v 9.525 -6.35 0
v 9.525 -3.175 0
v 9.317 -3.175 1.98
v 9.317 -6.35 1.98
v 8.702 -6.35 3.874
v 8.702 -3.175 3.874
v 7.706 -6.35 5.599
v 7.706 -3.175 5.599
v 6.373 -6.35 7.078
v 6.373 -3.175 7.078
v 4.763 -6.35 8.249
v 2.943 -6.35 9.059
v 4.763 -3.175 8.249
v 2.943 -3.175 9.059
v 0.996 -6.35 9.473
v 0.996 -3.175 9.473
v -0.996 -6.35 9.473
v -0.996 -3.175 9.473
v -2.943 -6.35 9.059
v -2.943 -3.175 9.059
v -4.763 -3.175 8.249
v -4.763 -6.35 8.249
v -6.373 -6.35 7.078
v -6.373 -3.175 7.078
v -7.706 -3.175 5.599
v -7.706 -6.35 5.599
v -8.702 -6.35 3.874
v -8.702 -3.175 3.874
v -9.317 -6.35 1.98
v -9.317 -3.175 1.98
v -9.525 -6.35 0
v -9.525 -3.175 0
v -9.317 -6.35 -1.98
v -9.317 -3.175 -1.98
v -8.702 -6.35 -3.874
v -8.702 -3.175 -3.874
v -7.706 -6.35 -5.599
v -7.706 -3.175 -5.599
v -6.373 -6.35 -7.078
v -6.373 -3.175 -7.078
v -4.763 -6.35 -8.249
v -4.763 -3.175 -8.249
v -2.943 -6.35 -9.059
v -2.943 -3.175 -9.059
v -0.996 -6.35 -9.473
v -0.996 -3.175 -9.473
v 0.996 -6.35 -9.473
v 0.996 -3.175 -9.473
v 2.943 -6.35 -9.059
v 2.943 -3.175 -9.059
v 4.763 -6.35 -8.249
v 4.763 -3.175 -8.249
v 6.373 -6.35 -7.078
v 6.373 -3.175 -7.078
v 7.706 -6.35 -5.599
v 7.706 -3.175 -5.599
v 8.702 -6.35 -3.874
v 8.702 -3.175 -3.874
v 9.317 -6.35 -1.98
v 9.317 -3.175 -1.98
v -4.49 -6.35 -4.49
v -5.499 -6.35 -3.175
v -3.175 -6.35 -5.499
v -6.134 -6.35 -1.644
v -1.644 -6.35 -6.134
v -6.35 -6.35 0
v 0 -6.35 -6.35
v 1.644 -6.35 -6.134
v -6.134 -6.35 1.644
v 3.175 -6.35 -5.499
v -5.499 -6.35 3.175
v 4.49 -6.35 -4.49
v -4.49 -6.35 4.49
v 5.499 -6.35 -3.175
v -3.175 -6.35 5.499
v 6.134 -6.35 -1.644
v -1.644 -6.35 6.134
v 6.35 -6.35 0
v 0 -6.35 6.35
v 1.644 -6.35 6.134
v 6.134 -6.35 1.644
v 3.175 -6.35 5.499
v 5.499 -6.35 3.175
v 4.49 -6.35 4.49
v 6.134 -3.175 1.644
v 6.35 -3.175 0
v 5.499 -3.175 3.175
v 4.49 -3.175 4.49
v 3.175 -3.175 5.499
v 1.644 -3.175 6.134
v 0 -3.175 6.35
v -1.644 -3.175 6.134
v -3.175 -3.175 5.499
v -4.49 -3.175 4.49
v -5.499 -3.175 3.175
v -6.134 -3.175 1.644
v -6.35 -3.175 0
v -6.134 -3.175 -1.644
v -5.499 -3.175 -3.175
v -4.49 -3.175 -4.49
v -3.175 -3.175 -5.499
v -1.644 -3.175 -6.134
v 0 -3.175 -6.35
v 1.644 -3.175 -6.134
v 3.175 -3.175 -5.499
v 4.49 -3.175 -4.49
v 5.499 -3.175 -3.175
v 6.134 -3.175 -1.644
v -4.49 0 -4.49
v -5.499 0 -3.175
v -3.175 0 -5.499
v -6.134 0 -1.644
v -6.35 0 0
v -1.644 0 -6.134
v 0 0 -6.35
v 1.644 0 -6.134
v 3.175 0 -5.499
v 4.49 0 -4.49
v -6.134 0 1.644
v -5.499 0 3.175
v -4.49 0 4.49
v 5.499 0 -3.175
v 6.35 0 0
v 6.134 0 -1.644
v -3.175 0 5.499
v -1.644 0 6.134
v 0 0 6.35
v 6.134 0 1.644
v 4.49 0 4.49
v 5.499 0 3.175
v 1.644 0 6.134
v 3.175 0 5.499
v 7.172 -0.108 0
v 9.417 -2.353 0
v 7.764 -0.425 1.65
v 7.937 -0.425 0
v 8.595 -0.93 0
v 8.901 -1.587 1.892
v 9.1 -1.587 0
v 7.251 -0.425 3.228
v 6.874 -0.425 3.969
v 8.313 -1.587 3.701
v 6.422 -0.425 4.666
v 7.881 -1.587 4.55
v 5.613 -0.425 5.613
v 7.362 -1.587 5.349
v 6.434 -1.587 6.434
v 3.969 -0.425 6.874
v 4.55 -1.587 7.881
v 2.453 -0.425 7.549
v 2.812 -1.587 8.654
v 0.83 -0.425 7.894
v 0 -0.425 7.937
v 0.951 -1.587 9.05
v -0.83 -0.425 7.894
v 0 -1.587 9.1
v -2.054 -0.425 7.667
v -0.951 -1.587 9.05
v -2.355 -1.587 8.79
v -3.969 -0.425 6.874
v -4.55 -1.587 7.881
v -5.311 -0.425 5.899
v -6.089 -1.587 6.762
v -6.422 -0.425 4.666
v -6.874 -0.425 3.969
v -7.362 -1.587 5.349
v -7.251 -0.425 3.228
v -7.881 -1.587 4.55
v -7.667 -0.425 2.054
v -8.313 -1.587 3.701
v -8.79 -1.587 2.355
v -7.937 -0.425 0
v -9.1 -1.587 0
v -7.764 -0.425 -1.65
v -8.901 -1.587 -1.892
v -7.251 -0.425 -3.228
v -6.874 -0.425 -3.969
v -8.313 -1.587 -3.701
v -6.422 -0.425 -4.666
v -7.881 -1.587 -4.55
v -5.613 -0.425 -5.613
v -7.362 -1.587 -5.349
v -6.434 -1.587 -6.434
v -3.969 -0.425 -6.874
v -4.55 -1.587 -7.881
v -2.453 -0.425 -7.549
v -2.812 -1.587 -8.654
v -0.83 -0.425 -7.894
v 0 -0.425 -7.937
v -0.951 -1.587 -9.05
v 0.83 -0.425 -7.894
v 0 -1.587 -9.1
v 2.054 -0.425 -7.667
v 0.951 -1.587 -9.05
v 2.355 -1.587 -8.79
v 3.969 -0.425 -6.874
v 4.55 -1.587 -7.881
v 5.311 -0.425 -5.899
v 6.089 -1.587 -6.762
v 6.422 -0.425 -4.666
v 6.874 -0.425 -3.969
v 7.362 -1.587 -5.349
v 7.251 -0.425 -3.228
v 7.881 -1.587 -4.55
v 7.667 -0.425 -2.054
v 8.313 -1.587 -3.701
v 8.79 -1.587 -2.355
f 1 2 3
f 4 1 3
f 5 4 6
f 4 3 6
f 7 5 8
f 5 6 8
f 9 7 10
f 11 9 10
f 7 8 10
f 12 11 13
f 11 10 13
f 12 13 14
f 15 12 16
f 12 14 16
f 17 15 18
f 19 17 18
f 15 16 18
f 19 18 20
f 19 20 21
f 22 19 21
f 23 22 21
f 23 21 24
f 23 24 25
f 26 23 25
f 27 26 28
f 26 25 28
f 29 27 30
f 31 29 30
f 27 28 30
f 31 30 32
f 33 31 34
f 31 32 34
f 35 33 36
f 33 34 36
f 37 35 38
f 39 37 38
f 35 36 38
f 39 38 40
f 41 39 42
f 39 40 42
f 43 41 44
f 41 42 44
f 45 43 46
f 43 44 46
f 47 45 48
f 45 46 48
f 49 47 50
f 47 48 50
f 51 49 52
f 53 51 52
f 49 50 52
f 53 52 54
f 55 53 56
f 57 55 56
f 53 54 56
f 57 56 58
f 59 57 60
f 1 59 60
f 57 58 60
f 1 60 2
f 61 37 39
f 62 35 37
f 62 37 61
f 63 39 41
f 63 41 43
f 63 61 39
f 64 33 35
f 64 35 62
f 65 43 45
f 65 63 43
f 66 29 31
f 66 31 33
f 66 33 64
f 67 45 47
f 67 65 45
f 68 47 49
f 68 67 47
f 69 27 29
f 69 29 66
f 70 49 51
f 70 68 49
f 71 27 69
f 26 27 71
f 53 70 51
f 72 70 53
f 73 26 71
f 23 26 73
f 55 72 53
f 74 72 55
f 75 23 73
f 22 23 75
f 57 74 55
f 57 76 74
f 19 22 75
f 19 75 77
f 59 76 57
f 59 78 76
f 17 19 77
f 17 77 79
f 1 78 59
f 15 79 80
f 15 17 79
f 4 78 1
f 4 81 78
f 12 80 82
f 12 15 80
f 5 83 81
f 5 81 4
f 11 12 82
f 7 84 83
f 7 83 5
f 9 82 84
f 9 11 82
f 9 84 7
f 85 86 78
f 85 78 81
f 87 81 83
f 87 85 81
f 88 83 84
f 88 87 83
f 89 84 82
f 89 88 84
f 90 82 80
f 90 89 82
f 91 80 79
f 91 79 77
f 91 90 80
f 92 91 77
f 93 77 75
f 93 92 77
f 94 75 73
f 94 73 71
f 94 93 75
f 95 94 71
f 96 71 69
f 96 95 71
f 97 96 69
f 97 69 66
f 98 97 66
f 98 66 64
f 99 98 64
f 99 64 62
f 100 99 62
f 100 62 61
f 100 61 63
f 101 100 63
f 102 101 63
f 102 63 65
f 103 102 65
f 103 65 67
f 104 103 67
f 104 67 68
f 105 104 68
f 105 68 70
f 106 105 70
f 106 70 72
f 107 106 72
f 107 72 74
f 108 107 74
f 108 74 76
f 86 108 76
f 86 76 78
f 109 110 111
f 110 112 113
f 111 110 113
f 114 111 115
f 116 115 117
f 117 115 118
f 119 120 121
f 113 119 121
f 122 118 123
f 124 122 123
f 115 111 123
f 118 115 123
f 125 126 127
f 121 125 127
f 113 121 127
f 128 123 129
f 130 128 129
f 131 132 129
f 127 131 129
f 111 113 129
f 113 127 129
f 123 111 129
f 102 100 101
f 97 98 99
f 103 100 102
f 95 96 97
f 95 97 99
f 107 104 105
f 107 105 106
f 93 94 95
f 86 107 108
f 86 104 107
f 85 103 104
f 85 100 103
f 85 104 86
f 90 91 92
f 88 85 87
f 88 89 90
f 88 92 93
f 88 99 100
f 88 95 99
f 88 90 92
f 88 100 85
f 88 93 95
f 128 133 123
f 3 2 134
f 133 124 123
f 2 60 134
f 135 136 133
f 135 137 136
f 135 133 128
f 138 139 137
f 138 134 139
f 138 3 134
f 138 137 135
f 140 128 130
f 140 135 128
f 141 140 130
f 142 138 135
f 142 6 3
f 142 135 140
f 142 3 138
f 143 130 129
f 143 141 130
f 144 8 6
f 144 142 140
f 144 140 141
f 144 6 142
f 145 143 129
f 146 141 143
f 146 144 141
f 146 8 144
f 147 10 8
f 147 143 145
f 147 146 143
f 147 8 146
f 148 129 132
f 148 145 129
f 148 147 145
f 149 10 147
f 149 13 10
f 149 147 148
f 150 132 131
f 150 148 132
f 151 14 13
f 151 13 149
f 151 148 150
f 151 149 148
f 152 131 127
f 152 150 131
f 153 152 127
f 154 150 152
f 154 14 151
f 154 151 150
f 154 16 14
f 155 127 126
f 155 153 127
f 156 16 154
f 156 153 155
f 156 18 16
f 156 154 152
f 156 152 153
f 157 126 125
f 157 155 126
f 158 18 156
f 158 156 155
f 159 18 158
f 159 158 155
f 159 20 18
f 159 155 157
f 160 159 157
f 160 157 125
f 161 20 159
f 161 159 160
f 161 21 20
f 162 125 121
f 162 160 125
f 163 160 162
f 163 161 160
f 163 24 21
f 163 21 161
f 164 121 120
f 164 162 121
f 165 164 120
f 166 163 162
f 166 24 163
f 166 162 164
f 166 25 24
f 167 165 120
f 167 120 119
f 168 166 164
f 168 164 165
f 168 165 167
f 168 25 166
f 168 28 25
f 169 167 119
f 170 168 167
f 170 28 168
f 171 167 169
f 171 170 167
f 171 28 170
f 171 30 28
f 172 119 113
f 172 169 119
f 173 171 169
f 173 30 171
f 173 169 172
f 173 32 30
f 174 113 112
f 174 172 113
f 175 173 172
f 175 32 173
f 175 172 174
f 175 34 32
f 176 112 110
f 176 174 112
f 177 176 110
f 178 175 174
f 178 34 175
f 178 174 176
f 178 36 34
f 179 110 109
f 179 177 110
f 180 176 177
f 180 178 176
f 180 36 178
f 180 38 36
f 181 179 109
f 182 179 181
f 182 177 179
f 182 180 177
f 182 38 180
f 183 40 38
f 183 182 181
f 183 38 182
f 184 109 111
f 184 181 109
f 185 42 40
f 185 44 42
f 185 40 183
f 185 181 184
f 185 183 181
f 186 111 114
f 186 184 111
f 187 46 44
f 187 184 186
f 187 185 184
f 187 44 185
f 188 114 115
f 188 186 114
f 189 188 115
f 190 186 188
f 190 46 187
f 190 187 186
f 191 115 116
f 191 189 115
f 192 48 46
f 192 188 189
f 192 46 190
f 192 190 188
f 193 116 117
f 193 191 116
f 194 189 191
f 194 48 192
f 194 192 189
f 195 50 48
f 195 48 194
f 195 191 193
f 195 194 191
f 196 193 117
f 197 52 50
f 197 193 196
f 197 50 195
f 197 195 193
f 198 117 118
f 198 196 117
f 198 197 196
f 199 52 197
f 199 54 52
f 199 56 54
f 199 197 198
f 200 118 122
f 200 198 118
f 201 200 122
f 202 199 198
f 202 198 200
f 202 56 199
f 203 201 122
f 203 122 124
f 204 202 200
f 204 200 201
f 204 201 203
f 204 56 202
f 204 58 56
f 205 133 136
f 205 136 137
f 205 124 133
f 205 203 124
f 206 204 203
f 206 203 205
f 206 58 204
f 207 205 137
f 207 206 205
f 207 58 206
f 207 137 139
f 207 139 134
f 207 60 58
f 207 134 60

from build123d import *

# Parameters (mm, degrees)
F0_R     = 9.525
F0_R_2   = 6.35
F1_DEPTH = 6.35
F2_DEPTH = 3.175
F3_R     = 3.175


with BuildPart() as f1:
    # F0 (on Front) → F1 (new body)
    with BuildSketch(Plane.XZ):
        Circle(F0_R)
        Circle(F0_R_2, mode=Mode.SUBTRACT)
    extrude(amount=F1_DEPTH)

    # F0 (on Front) → F2 (join)
    with BuildSketch(Plane.XZ):
        Circle(F0_R_2)
    extrude(amount=F2_DEPTH)

    # F3
    f3_edges = [f1.edges().sort_by_distance(p)[0] for p in [
        (-9.525, 0, 0),
    ]]
    fillet(f3_edges, radius=F3_R)


solid = f1.part
